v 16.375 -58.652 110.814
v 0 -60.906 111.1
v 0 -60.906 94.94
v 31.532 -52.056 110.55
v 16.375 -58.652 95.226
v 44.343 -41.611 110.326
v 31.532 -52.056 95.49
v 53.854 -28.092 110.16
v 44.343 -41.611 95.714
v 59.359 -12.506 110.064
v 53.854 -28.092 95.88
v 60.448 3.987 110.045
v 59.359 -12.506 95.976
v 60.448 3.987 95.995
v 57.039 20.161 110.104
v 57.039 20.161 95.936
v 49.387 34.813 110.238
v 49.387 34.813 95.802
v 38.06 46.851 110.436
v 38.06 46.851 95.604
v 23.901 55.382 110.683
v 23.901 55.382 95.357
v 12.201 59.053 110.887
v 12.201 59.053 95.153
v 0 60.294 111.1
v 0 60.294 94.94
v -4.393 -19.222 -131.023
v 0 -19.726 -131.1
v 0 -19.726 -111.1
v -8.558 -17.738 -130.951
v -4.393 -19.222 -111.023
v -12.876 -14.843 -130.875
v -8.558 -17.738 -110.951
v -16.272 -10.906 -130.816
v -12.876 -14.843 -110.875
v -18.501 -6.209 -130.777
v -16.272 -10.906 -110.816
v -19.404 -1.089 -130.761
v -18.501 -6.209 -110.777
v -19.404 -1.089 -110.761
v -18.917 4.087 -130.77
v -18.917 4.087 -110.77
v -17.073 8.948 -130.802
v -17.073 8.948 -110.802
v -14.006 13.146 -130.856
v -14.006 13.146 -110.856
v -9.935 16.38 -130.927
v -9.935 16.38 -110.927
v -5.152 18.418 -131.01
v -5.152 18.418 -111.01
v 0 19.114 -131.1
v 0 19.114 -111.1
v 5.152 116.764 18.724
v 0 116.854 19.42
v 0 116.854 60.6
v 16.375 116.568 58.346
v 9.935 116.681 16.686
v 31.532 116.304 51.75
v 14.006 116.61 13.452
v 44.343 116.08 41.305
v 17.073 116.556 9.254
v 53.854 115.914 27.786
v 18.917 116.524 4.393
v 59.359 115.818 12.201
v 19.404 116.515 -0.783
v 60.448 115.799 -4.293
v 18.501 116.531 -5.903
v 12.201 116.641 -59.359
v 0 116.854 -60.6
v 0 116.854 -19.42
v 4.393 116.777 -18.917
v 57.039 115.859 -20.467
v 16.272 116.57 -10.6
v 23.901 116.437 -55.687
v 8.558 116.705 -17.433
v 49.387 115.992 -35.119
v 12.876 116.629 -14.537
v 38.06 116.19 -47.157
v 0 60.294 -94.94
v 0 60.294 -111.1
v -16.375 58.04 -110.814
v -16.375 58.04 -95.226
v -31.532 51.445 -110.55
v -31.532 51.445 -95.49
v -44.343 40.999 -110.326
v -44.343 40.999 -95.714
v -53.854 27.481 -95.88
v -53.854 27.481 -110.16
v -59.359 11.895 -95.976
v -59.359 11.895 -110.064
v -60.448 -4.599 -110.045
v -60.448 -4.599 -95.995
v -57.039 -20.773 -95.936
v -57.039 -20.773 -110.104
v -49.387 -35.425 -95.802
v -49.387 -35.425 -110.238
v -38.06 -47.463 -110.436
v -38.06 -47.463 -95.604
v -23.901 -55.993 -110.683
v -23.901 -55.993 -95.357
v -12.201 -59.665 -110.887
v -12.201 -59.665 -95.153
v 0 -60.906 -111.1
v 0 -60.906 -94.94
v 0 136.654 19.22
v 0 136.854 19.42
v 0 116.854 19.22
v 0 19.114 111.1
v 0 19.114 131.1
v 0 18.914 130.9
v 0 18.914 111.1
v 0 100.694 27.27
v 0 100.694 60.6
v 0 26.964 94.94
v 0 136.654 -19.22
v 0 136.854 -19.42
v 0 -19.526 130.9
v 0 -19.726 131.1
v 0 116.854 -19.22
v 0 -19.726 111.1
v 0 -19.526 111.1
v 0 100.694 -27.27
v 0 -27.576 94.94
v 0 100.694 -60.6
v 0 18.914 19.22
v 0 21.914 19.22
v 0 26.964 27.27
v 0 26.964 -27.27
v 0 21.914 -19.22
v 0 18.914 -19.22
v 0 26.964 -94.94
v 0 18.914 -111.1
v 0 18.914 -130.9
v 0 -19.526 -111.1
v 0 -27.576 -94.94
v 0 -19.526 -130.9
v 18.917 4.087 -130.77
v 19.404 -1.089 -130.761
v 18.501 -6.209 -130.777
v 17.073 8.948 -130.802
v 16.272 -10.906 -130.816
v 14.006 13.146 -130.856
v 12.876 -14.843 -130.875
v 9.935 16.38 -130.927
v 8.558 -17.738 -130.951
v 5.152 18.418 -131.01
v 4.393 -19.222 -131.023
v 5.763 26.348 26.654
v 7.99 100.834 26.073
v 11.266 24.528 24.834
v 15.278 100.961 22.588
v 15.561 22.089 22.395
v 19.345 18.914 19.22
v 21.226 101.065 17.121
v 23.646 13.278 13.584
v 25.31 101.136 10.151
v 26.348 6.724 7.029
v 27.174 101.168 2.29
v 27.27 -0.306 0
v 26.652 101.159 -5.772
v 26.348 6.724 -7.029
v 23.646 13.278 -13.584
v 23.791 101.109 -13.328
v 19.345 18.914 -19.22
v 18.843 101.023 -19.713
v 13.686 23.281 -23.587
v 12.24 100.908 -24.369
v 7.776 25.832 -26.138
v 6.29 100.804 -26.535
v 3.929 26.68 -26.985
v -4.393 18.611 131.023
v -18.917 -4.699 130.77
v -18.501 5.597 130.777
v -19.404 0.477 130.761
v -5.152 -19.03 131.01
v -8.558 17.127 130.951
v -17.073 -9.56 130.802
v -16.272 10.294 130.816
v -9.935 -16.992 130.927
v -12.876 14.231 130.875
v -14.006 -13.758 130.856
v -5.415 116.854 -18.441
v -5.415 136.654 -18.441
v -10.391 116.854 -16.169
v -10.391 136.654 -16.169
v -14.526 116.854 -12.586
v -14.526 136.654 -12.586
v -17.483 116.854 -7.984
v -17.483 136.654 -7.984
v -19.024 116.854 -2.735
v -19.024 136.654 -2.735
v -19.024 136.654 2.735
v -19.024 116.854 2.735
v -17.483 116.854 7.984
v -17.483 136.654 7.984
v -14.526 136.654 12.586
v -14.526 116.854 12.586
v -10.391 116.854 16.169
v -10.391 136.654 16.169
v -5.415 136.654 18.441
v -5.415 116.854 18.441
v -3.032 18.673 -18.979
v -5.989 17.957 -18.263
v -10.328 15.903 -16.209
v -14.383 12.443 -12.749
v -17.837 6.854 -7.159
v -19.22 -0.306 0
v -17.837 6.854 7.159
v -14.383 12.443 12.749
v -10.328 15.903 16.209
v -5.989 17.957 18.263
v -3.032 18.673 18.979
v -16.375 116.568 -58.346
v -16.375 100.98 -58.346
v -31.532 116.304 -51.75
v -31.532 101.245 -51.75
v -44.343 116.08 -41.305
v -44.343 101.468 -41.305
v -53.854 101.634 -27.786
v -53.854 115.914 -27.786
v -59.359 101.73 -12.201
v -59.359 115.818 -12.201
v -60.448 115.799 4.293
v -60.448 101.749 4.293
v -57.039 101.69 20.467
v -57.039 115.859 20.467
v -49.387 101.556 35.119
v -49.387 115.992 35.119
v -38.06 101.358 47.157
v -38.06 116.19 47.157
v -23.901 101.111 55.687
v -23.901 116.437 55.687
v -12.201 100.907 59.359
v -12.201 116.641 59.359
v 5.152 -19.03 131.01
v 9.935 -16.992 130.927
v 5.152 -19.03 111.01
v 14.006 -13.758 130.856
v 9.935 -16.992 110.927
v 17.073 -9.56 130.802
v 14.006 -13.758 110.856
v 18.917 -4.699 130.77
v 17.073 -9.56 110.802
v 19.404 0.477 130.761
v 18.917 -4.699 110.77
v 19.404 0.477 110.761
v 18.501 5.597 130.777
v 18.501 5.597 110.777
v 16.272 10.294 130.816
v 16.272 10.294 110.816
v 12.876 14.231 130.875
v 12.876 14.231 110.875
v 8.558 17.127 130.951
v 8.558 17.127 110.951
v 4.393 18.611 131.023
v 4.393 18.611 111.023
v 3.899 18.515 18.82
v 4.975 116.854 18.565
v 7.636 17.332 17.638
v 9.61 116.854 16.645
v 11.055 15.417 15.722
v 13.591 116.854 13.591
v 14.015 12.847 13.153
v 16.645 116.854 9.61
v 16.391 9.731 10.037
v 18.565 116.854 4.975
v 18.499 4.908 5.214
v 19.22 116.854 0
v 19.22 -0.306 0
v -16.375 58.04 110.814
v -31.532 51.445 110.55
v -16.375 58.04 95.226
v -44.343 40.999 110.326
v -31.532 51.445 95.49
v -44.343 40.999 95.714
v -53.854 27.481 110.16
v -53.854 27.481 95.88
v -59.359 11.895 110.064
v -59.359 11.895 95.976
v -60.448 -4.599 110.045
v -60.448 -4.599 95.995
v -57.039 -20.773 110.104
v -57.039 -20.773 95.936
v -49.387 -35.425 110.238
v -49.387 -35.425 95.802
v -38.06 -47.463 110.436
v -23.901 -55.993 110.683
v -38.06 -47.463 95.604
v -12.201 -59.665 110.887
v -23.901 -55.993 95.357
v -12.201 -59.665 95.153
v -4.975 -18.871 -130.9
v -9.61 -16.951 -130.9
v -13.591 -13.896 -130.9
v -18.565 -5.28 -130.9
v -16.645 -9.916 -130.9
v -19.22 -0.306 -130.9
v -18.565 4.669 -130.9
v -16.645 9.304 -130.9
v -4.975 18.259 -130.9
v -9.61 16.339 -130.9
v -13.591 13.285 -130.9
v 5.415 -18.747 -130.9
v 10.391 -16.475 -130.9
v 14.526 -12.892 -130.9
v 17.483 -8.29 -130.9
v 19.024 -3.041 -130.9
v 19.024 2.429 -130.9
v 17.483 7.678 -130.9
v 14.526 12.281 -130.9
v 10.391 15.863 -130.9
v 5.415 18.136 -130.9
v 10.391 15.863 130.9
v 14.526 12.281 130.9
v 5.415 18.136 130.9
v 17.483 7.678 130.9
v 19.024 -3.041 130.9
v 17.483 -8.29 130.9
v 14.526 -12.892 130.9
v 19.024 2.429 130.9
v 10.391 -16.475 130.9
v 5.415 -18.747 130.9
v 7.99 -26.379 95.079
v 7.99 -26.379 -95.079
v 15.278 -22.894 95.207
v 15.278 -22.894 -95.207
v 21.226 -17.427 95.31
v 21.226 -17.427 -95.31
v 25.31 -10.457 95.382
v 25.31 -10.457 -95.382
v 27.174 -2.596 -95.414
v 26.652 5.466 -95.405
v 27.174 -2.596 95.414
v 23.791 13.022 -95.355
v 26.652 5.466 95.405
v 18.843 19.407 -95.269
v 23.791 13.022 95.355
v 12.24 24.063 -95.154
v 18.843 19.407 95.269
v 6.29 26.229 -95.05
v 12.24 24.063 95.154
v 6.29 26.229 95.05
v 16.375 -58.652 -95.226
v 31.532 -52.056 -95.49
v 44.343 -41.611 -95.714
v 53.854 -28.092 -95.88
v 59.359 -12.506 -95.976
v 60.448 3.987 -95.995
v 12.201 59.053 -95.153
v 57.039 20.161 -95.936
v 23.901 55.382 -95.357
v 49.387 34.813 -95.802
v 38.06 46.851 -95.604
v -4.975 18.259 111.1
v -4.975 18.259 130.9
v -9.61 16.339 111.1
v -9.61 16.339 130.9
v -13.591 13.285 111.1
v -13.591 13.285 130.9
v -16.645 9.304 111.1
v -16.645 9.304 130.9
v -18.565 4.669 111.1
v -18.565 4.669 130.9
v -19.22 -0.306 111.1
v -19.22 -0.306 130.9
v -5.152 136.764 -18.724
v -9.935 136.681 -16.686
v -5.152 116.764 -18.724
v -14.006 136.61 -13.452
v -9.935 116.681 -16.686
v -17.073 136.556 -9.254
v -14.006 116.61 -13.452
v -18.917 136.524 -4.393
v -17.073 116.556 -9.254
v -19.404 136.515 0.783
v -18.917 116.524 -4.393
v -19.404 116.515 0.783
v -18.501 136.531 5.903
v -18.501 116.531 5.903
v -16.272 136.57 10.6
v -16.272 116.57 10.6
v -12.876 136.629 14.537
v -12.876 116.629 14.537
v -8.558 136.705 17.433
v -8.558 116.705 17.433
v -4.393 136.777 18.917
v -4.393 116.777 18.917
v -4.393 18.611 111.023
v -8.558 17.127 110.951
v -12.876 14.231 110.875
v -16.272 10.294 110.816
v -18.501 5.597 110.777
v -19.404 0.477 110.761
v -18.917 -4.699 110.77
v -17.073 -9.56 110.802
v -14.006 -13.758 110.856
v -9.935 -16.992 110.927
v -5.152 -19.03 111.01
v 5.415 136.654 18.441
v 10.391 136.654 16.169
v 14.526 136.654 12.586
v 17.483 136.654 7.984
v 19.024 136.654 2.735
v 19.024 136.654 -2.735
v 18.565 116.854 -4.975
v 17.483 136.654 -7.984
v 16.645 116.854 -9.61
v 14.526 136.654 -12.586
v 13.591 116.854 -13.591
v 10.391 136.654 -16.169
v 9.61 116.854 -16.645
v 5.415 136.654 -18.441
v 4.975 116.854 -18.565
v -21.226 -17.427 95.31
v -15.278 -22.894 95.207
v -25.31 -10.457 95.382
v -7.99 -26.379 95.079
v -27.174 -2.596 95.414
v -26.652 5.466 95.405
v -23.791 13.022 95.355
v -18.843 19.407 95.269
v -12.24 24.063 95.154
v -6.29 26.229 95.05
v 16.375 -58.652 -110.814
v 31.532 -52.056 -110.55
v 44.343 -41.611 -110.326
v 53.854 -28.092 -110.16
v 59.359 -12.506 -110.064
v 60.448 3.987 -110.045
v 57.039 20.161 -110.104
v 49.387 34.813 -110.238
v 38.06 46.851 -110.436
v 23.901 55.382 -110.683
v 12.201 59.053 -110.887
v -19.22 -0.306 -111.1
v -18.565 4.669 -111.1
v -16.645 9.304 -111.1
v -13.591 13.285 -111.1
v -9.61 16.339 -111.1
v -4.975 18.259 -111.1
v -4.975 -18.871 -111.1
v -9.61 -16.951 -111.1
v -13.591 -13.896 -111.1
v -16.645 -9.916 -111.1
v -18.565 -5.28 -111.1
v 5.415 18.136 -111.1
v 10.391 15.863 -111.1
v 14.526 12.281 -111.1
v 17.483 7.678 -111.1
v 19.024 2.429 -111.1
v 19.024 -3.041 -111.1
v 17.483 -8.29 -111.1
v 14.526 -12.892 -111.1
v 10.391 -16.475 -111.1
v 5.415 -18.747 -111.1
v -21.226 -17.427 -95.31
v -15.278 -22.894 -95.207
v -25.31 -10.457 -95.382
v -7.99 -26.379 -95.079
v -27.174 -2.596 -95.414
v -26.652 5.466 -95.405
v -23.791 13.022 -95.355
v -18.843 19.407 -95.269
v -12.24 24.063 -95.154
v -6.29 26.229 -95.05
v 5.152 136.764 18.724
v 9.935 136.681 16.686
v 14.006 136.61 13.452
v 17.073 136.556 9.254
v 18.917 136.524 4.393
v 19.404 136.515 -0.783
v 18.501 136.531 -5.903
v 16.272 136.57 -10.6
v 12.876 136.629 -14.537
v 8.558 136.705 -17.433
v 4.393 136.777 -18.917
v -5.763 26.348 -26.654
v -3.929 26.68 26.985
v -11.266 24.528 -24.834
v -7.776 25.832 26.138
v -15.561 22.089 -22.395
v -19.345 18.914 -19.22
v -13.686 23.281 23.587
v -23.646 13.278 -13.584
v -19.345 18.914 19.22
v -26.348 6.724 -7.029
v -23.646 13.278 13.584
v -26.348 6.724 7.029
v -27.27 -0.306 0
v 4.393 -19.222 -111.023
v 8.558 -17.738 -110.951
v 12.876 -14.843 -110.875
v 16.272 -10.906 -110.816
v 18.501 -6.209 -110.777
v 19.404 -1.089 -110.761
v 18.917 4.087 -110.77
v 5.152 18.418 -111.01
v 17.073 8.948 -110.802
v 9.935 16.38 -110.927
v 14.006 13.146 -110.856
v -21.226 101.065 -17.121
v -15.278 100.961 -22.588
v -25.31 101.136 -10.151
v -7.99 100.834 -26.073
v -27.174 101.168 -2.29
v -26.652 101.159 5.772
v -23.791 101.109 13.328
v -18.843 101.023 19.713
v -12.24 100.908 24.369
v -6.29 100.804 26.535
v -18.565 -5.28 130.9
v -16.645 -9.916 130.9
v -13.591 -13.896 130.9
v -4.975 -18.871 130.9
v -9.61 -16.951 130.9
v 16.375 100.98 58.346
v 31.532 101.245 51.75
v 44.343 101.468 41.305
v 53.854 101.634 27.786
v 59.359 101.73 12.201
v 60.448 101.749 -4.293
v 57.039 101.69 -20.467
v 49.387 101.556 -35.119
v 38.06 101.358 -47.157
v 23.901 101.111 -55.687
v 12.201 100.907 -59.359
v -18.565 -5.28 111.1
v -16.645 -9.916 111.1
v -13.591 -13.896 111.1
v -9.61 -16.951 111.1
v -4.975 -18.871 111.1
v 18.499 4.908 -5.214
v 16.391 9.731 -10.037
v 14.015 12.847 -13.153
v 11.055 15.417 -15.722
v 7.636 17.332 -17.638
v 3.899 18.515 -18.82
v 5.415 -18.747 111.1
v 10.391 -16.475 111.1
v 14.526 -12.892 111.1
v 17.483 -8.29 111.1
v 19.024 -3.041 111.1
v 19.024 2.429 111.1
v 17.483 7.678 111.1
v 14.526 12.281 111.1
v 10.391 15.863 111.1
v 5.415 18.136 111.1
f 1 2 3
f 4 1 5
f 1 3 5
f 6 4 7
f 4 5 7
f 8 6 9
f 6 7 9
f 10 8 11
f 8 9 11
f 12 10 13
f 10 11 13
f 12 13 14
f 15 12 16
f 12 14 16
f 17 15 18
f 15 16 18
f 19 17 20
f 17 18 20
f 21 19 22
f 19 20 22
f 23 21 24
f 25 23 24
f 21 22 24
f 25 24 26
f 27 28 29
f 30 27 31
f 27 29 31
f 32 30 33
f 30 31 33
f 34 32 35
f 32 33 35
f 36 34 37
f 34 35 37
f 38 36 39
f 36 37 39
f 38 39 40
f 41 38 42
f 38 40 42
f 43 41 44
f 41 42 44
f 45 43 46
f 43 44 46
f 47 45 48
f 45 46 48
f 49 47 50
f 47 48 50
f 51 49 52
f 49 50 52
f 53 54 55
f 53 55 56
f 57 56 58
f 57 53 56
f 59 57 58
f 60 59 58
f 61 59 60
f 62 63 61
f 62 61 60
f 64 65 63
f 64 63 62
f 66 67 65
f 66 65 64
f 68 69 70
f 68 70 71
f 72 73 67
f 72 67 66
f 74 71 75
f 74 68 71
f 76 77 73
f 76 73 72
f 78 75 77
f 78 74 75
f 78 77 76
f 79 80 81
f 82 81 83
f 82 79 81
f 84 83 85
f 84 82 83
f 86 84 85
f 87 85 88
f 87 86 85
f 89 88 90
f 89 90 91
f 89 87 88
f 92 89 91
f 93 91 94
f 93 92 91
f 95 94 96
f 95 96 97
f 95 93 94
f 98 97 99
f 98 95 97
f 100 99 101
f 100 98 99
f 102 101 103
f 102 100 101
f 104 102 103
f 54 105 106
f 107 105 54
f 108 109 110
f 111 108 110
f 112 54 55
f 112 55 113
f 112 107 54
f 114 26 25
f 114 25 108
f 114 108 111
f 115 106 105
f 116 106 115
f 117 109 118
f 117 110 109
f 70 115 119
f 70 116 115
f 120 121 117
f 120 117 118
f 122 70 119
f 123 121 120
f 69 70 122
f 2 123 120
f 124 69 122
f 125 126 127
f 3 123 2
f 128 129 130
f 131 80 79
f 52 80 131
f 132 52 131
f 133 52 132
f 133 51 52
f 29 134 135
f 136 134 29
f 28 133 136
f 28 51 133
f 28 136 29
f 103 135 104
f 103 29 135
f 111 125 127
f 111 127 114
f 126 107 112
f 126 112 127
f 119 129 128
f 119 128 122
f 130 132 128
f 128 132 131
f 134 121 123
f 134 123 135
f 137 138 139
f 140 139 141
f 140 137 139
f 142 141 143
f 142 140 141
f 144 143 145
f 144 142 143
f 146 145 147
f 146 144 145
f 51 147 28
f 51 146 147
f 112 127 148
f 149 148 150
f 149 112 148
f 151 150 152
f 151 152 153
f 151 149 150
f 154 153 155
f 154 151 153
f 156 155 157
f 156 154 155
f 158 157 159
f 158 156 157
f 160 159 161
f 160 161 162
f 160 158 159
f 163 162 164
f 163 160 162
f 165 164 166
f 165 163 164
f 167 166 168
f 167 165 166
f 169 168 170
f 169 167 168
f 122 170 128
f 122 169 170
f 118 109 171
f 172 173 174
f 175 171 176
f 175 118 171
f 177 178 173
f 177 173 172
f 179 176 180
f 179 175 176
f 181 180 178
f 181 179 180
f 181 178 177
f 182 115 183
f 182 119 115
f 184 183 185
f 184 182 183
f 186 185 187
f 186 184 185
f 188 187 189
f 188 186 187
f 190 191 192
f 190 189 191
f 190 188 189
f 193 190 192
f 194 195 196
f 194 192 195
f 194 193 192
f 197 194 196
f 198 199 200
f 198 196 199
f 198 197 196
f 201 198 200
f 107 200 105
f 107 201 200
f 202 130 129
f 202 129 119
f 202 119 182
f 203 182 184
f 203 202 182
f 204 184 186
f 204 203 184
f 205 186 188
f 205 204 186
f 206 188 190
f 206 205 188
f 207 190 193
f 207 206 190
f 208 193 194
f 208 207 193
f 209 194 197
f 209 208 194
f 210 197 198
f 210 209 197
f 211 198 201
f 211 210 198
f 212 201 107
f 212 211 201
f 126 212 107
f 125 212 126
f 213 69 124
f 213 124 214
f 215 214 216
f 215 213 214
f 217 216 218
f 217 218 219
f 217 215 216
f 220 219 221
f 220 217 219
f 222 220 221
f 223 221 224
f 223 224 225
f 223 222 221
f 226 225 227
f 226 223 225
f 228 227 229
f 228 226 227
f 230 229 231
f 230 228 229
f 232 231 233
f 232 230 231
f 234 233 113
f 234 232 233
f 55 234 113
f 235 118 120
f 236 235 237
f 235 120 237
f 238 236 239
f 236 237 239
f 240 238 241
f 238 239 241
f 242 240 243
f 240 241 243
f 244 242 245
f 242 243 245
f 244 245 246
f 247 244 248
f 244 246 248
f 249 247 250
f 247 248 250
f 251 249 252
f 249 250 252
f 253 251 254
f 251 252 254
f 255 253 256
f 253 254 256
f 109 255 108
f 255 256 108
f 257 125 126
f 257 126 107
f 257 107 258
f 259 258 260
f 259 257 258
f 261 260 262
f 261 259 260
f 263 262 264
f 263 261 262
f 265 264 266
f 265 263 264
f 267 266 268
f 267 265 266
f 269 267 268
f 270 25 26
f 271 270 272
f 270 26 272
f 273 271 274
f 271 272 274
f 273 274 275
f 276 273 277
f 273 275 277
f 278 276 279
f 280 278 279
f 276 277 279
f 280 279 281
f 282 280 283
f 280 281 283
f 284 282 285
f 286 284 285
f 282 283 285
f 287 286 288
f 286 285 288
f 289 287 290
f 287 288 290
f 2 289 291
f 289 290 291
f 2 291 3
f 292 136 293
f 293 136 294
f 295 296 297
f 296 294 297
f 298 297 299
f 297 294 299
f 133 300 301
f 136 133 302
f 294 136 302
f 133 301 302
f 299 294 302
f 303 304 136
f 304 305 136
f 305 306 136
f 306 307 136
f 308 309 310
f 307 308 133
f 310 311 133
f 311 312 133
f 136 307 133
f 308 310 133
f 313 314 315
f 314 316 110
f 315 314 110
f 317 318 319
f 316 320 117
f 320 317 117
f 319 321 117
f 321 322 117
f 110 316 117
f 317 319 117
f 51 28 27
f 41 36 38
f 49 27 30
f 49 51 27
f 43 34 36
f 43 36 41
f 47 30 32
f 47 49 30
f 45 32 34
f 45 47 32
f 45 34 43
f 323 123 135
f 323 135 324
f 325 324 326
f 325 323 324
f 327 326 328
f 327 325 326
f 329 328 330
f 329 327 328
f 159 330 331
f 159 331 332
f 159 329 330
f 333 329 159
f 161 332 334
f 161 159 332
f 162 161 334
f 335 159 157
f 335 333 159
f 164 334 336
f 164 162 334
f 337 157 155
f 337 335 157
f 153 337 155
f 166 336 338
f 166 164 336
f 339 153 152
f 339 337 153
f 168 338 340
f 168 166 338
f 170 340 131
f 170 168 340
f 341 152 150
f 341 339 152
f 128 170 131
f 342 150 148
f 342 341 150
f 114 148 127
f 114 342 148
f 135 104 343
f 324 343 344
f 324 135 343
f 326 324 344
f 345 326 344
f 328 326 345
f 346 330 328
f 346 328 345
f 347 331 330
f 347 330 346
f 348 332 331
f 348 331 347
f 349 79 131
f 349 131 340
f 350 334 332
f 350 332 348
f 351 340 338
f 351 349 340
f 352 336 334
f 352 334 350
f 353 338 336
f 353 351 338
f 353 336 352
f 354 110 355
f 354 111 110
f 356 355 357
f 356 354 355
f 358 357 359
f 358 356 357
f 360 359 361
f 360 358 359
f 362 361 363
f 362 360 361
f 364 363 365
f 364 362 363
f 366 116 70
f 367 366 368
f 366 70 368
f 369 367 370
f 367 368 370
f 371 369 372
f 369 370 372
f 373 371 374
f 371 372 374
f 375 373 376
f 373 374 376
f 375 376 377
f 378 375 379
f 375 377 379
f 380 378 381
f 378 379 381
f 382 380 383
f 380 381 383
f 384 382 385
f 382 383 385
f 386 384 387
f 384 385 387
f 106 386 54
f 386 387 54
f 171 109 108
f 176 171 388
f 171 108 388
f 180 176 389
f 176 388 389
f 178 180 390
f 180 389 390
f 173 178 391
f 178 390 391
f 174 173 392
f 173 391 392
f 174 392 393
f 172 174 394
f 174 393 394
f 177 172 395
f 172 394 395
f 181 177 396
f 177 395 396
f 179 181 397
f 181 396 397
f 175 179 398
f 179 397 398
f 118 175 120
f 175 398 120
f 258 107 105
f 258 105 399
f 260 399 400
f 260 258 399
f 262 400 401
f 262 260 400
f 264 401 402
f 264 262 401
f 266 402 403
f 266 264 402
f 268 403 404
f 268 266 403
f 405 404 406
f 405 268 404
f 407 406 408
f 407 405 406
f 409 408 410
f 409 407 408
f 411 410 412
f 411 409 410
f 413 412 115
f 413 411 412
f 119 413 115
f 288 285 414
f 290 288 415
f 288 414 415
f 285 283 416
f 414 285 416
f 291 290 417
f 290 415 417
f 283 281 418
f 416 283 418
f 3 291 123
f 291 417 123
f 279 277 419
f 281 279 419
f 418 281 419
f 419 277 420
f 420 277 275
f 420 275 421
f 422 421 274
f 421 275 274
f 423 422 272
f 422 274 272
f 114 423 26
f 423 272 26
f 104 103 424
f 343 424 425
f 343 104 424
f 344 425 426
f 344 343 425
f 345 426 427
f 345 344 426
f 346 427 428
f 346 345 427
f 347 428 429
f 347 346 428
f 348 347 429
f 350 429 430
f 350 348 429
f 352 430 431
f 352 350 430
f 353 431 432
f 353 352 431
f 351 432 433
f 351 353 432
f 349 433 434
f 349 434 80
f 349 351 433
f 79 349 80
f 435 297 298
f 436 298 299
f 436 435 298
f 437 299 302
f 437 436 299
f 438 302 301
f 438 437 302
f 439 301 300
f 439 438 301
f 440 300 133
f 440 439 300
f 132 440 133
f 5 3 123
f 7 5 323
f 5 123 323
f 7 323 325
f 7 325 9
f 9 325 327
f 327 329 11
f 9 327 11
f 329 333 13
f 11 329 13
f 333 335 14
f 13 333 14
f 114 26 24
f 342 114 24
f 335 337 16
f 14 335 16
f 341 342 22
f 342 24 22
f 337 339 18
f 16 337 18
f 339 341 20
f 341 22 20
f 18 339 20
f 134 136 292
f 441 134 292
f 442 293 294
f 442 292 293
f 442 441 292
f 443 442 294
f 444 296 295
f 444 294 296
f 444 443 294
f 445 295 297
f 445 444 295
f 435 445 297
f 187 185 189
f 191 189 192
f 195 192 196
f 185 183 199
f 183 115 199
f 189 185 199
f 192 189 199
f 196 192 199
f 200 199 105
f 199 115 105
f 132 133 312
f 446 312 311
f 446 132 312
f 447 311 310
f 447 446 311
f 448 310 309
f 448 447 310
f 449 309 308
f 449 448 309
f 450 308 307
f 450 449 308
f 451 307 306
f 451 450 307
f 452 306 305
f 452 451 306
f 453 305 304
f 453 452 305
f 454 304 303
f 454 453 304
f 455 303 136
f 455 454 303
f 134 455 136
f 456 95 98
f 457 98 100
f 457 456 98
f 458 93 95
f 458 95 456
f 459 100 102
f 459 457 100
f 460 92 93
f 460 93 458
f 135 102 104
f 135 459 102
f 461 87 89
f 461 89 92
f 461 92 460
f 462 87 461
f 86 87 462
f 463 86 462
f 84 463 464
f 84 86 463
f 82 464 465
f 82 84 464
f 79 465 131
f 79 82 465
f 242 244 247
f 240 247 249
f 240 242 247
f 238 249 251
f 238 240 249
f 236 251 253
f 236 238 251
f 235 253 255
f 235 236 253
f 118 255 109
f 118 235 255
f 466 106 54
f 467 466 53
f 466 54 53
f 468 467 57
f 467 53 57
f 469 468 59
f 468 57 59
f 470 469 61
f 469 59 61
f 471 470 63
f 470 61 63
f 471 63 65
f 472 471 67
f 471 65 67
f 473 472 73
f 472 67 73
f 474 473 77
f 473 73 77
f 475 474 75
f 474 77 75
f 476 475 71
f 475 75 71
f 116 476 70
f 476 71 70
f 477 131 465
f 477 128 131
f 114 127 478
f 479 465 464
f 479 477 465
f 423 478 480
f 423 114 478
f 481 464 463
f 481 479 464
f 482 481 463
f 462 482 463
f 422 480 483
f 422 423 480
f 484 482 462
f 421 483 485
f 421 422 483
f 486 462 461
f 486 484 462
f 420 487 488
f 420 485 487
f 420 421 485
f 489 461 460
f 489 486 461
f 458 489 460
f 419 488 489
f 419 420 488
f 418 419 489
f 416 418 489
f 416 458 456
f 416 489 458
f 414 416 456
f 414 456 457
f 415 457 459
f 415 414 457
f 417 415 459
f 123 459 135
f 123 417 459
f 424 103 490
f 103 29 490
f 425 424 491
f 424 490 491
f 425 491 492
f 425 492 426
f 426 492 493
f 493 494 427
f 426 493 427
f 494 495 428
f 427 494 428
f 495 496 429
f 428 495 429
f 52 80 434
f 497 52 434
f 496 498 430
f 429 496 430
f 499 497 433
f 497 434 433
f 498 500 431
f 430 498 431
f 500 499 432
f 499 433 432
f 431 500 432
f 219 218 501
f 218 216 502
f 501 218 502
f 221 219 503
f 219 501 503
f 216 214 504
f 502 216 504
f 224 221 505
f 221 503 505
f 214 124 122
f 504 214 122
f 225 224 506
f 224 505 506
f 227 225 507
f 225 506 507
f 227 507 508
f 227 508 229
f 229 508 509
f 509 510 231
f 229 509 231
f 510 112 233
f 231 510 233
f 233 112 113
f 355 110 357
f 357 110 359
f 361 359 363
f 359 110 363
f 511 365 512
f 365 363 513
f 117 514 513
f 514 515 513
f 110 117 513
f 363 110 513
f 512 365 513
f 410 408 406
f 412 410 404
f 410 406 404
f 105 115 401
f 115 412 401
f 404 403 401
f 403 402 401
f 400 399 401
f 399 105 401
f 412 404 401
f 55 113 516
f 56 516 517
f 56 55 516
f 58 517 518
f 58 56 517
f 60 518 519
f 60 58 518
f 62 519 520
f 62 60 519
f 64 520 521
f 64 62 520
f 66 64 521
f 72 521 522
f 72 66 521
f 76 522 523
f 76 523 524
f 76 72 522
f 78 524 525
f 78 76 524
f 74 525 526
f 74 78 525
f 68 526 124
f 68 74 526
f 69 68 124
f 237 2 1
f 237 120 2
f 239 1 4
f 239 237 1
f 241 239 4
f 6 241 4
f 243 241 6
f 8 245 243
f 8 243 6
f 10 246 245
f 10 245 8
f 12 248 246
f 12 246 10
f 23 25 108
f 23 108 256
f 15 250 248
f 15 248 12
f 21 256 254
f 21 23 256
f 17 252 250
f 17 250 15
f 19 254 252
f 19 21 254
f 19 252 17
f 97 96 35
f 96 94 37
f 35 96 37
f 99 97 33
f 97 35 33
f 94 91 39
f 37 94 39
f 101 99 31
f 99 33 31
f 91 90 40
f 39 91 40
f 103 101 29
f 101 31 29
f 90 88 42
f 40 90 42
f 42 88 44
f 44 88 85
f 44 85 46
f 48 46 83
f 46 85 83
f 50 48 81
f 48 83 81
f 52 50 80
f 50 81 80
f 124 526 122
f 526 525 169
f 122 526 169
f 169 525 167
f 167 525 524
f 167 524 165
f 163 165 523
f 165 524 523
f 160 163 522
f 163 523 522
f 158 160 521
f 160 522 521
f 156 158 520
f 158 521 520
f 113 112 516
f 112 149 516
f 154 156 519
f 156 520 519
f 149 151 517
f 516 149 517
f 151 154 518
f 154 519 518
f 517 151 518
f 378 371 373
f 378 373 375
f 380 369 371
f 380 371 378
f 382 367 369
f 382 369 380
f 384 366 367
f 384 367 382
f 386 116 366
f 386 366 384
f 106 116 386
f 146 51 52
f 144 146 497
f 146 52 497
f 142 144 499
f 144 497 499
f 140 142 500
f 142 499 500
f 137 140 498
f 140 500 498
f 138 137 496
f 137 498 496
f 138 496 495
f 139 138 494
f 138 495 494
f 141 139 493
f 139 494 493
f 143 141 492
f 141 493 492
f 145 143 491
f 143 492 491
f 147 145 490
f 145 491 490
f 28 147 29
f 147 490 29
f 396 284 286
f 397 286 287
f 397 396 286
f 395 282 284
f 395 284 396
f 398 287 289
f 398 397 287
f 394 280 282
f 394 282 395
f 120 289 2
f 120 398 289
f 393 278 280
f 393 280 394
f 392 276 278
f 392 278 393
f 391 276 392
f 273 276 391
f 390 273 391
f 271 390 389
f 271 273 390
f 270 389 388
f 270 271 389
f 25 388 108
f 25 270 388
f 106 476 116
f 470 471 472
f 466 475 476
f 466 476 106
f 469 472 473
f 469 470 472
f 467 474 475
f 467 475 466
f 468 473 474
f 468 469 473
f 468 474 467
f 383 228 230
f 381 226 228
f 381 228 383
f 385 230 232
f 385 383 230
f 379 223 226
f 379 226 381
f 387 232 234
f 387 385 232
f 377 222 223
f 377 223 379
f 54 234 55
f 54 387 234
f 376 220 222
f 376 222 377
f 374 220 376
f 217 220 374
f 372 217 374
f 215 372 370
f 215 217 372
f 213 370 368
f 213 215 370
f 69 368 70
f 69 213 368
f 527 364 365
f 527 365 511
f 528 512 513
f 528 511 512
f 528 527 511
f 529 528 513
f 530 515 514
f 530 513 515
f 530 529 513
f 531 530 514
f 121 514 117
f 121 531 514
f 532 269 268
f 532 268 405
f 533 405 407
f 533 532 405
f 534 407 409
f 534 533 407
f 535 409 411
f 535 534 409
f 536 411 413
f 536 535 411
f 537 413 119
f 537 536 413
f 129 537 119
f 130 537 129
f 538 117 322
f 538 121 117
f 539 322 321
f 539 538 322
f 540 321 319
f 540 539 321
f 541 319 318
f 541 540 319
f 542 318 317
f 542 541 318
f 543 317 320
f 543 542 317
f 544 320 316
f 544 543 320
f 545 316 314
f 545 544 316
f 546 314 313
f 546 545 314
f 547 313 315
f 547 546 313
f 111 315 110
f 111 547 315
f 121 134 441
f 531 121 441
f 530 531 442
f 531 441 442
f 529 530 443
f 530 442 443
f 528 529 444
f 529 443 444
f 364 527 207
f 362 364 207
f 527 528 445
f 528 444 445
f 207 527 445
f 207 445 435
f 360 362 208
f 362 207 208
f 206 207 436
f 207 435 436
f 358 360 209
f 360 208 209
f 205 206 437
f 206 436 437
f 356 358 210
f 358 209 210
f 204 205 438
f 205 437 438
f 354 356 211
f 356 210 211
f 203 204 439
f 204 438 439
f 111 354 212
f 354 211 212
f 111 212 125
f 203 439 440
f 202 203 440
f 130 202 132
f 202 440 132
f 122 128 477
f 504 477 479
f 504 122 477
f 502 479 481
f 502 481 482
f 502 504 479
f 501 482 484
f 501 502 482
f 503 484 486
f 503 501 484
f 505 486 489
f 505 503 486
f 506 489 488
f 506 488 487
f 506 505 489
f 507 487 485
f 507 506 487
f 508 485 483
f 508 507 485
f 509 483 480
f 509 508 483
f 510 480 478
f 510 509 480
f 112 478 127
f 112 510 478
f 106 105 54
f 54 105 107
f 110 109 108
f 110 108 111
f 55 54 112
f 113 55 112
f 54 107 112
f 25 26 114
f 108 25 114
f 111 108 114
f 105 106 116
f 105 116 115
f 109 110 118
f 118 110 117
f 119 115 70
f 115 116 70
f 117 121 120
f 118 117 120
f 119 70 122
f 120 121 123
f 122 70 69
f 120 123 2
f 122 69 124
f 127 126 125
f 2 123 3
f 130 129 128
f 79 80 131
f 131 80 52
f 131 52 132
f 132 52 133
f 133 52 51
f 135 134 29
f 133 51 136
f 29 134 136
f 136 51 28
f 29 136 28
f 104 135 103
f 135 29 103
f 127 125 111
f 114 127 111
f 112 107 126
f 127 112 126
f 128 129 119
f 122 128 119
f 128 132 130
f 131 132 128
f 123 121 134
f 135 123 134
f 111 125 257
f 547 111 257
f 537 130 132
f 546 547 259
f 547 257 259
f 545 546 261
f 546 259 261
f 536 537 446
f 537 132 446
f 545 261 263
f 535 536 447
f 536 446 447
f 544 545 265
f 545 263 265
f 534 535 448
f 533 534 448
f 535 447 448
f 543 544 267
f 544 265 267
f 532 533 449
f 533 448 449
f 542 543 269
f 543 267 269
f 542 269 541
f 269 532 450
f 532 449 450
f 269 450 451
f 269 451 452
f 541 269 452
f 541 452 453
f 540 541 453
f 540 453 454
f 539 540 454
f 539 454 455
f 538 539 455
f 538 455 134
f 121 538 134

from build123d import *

# Parameters (mm, degrees)
SKETCH1_R                = 27
SKETCH1_R_2              = 22
BOSS_EXTRUDE1_DEPTH      = 94
SKETCH2_R                = 60
SKETCH2_R_2              = 22
BOSS_EXTRUDE2_DEPTH      = 16
BOSS_EXTRUDE3_REACH      = 205.224
BOSS_EXTRUDE3_END_RADIUS = 27
SKETCH3_R                = 27
SKETCH3_R_2              = 22
SKETCH4_R                = 22
CUT_EXTRUDE5_DEPTH       = 100
BOSS_EXTRUDE4_START      = 16
SKETCH6_R                = 60
SKETCH6_R_2              = 22
BOSS_EXTRUDE4_DEPTH      = 16
SCALE1_SCALE             = 1.01
MOVE_START               = 18.914152479
MOVE_FACE1_OUTLINE_R     = 22.22
MOVE_FACE1_OUTLINE_R_2   = 19.22
MOVE_FACE1_DEPTH         = 97.9399999
MOVE_START_2             = -111.1
MOVE_FACE1_2_OUTLINE_R   = 19.22
MOVE_FACE1_2_DEPTH       = 222.2
MOVE_FACE1_3_DEPTH       = 91.8799999
MOVE_START_3             = 19.2200001
MOVE_FACE1_4_DEPTH       = 91.8799999
MOVE_START_4             = -0.305847721
MOVE_FACE1_5_OUTLINE_R   = 19.22
MOVE_FACE1_5_DEPTH       = 19.220000155
MOVE_START_5             = 11.257393302
MOVE_FACE1_6_DEPTH       = 7.656759132
SKETCH7_R                = 19.42
BOSS_EXTRUDE5_DEPTH      = 20
SKETCH8_R                = 19.42
BOSS_EXTRUDE6_DEPTH      = 20
SKETCH10_R               = 19.42
BOSS_EXTRUDE7_DEPTH      = 20
SHELL1_T                 = -0.2
SHELL2_T                 = -0.2
SHELL3_T                 = -0.2
SPLIT1_SURFACE_1_BACK    = 351.068
SPLIT1_SURFACE_1_DEPTH   = 702.136
SPLIT1_SURFACE_2_BACK    = 351.068
SPLIT1_SURFACE_2_DEPTH   = 702.136
DRAFT11_ANGLE            = 1
DRAFT12_ANGLE            = -1


with BuildPart() as part:
    # Sketch1 → Boss-Extrude1 (new, symmetric)
    with BuildSketch(Plane.XY):
        Circle(SKETCH1_R)
        Circle(SKETCH1_R_2, mode=Mode.SUBTRACT)
    extrude(amount=BOSS_EXTRUDE1_DEPTH, both=True)

    # Sketch2 → Boss-Extrude2 (add)
    with BuildSketch(Plane.XY.offset(94)):
        Circle(SKETCH2_R)
        Circle(SKETCH2_R_2, mode=Mode.SUBTRACT)
    boss_extrude2 = extrude(amount=BOSS_EXTRUDE2_DEPTH)

    # Mirror1: Boss-Extrude2 across plane
    add(boss_extrude2.mirror(Plane.XY))

    # Boss-Extrude3: up to this cylinder (the profile starts outside it)
    boss_extrude3_end = Plane(origin=(0, 0, -26.236325), z_dir=(0, 0, -1)) * Cylinder(BOSS_EXTRUDE3_END_RADIUS, 465.448, mode=Mode.PRIVATE)
    # Sketch3 → Boss-Extrude3 (add, up to the surface)
    with BuildSketch(Plane(origin=(0, 100, 0), x_dir=(1, 0, 0), z_dir=(0, 1, 0)), mode=Mode.PRIVATE) as boss_extrude3_sk1:
        with Locations(Location((0, 0, 0), (0, 0, 270))):
            Circle(SKETCH3_R)
        with Locations(Location((0, 0, 0), (0, 0, 270))):
            Circle(SKETCH3_R_2, mode=Mode.SUBTRACT)
    boss_extrude3_tool1 = extrude(boss_extrude3_sk1.sketch, amount=-BOSS_EXTRUDE3_REACH, mode=Mode.PRIVATE) - boss_extrude3_end
    add(boss_extrude3_tool1.solids().sort_by_distance((0, 100, -26.236325))[0])

    # Sketch4 → Cut-Extrude5 (cut)
    with BuildSketch(Plane(origin=(0, 100, 0), x_dir=(1, 0, 0), z_dir=(0, 1, 0))):
        with Locations(Location((0, 0, 0), (0, 0, 270))):
            Circle(SKETCH4_R)
    extrude(amount=-CUT_EXTRUDE5_DEPTH, mode=Mode.SUBTRACT)

    # Sketch6 → Boss-Extrude4 (add)
    with BuildSketch(Plane(origin=(0, 100, 0), x_dir=(1, 0, 0), z_dir=(0, 1, 0)).offset(BOSS_EXTRUDE4_START)):
        with Locations(Location((0, 0, 0), (0, 0, 270))):
            Circle(SKETCH6_R)
        with Locations(Location((0, 0, 0), (0, 0, 270))):
            Circle(SKETCH6_R_2, mode=Mode.SUBTRACT)
    extrude(amount=-BOSS_EXTRUDE4_DEPTH)


with BuildPart() as part_1:
    # Scale1: scaled about (0, 30.584762689, 0)
    add(part.part.scale(SCALE1_SCALE).moved(Location((0, -0.305847627, 0))))

    # Move Face1: read off the stored shape, not the designer's step
    # Move Face1 outline → Move Face1 (add)
    with BuildSketch(Plane(origin=(0, 0, 0), x_dir=(1, 0, 0), z_dir=(0, 1, 0)).offset(MOVE_START)):
        with Locations((6e-09, 0)):
            Circle(MOVE_FACE1_OUTLINE_R)
        with Locations((6e-09, 0)):
            Circle(MOVE_FACE1_OUTLINE_R_2, mode=Mode.SUBTRACT)
    extrude(amount=MOVE_FACE1_DEPTH)

    # Move Face1 2 outline → Move Face1 2 (add)
    with BuildSketch(Plane.XY.offset(MOVE_START_2)):
        with BuildLine():
            Line((6e-09, 18.914152429), (-19.345399865, 18.914152479))
            ThreePointArc((-19.345399865, 18.914152479), (6e-09, -27.575847621), (19.345399877, 18.914152479))
            Line((19.345399877, 18.914152479), (6e-09, 18.914152429))
        make_face()
        with Locations((6e-09, -0.305847621)):
            Circle(MOVE_FACE1_2_OUTLINE_R, mode=Mode.SUBTRACT)
    extrude(amount=MOVE_FACE1_2_DEPTH)

    # Move Face1 3 outline → Move Face1 3 (add)
    with BuildSketch(Plane.XY.offset(MOVE_START_2)):
        with BuildLine():
            Line((-11.149887713, 18.914152479), (11.149887725, 18.914152479))
            ThreePointArc((11.149887725, 18.914152479), (6e-09, 21.914152379), (-11.149887713, 18.914152479))
        make_face()
    extrude(amount=MOVE_FACE1_3_DEPTH)

    # Move Face1 4 outline → Move Face1 4 (add)
    with BuildSketch(Plane.XY.offset(MOVE_START_3)):
        with BuildLine():
            Line((-11.149887713, 18.914152479), (11.149887725, 18.914152479))
            ThreePointArc((11.149887725, 18.914152479), (6e-09, 21.914152379), (-11.149887713, 18.914152479))
        make_face()
    extrude(amount=MOVE_FACE1_4_DEPTH)

    # Move Face1 5 outline → Move Face1 5 (cut)
    with BuildSketch(Plane(origin=(0, 0, 0), x_dir=(1, 0, 0), z_dir=(0, 1, 0)).offset(MOVE_START_4)):
        with Locations((6e-09, 0)):
            Circle(MOVE_FACE1_5_OUTLINE_R)
    extrude(amount=MOVE_FACE1_5_DEPTH, mode=Mode.SUBTRACT)

    # Move Face1 6 outline → Move Face1 6 (add)
    with BuildSketch(Plane(origin=(0, 0, 0), x_dir=(1, 0, 0), z_dir=(0, 1, 0)).offset(MOVE_START_5)):
        with BuildLine():
            ThreePointArc((19.345399877, -10.930869308), (22.220000006, 0), (19.345399877, 10.930869308))
            Line((19.345399877, 10.930869308), (19.345399877, -10.930869308))
        make_face()
        with BuildLine():
            Line((-19.345399865, -10.930869308), (-19.345399865, 10.930869308))
            ThreePointArc((-19.345399865, 10.930869308), (-22.219999994, 0), (-19.345399865, -10.930869308))
        make_face()
    extrude(amount=MOVE_FACE1_6_DEPTH)


with BuildPart() as body_2:
    # Sketch7 → Boss-Extrude5 (new body)
    with BuildSketch(Plane(origin=(0, 116.854152379, 0), x_dir=(1, 0, 0), z_dir=(0, 1, 0))):
        with Locations(Location((6e-09, 0, 0), (0, 0, 270))):
            Circle(SKETCH7_R)
    extrude(amount=BOSS_EXTRUDE5_DEPTH)

    # Shell1
    shell1_openings = [body_2.faces().sort_by_distance(p)[0] for p in [
        (6e-09, 116.854152379, 0),
    ]]
    offset(amount=SHELL1_T, openings=shell1_openings, kind=Kind.INTERSECTION)


with BuildPart() as body_3:
    # Sketch8 → Boss-Extrude6 (new body)
    with BuildSketch(Plane(origin=(0, 0, -111.1), x_dir=(-1, 0, 0), z_dir=(0, 0, -1))):
        with Locations((-6e-09, -0.305847621)):
            Circle(SKETCH8_R)
    extrude(amount=BOSS_EXTRUDE6_DEPTH)

    # Shell2
    shell2_openings = [body_3.faces().sort_by_distance(p)[0] for p in [
        (6e-09, -0.305847621, -111.1),
    ]]
    offset(amount=SHELL2_T, openings=shell2_openings, kind=Kind.INTERSECTION)


with BuildPart() as body_4:
    # Sketch10 → Boss-Extrude7 (new body)
    with BuildSketch(Plane.XY.offset(111.1)):
        with Locations(Location((6e-09, -0.305847621, 0), (0, 0, 180))):
            Circle(SKETCH10_R)
    extrude(amount=BOSS_EXTRUDE7_DEPTH)

    # Shell3
    shell3_openings = [body_4.faces().sort_by_distance(p)[0] for p in [
        (6e-09, -0.305847621, 111.1),
    ]]
    offset(amount=SHELL3_T, openings=shell3_openings, kind=Kind.INTERSECTION)

    # Combine6: union body 2, body 3, part
    add(body_2.part)
    add(body_3.part)
    add(part_1.part)


with BuildPart() as body_2_2:
    # Split1: the piece behind the surface
    add(body_4.part)
    # Split1 surface: a surface, the sketch's curves swept straight by 702.136 mm
    with BuildLine(Plane.XY.offset(-SPLIT1_SURFACE_1_BACK), mode=Mode.PRIVATE) as split1_surface_1_path:
        Line((0, 140.918686574), (0, -64.970381816))
    split1_surface_1 = Shell.extrude(split1_surface_1_path.wire(), (0 * SPLIT1_SURFACE_1_DEPTH, 0 * SPLIT1_SURFACE_1_DEPTH, 1 * SPLIT1_SURFACE_1_DEPTH))
    split(bisect_by=split1_surface_1, keep=Keep.BOTTOM)

    # Draft12
    draft12_faces = [body_2_2.faces().sort_by_distance(p)[0] for p in [
        (-29.311291464, -0.305847627, 94.94),
        (-8.242103984, -0.305847621, 131.1),
        (-27.719709478, -0.305847628, 111.1),
        (-29.311291464, -0.305847627, -94.94),
        (-8.242103984, -0.305847621, -131.1),
        (-27.719709478, -0.305847628, -111.1),
        (-29.311291464, 100.694152373, 0),
        (-8.242103984, 136.854152379, 0),
        (-27.719709478, 116.854152373, 0),
    ]]
    draft(draft12_faces, Plane(origin=(0, 0, 0), x_dir=(0, 0, 1), z_dir=(1, 0, 0)), DRAFT12_ANGLE)


with BuildPart() as body_4_1:
    add(body_4.part)

    # Split1: split by a surface, the side it looks to stays
    # Split1 surface: a surface, the sketch's curves swept straight by 702.136 mm
    with BuildLine(Plane.XY.offset(-SPLIT1_SURFACE_2_BACK), mode=Mode.PRIVATE) as split1_surface_2_path:
        Line((0, 140.918686574), (0, -64.970381816))
    split1_surface_2 = Shell.extrude(split1_surface_2_path.wire(), (0 * SPLIT1_SURFACE_2_DEPTH, 0 * SPLIT1_SURFACE_2_DEPTH, 1 * SPLIT1_SURFACE_2_DEPTH))
    split(bisect_by=split1_surface_2, keep=Keep.TOP)

    # Draft11
    draft11_faces = [body_4_1.faces().sort_by_distance(p)[0] for p in [
        (29.311291464, 100.694152373, 0),
        (8.242103989, -0.305847621, -131.1),
        (8.242103989, -0.305847621, 131.1),
        (27.719709479, -0.305847628, 111.1),
        (29.311291464, -0.305847627, 94.94),
        (29.311291464, -0.305847627, -94.94),
        (27.719709479, -0.305847628, -111.1),
        (8.242103989, 136.854152379, 0),
        (27.719709479, 116.854152373, 0),
    ]]
    draft(draft11_faces, Plane(origin=(0, 0, 0), x_dir=(0, 0, 1), z_dir=(1, 0, 0)), DRAFT11_ANGLE)


solid = Compound([body_2_2.part, body_4_1.part])
